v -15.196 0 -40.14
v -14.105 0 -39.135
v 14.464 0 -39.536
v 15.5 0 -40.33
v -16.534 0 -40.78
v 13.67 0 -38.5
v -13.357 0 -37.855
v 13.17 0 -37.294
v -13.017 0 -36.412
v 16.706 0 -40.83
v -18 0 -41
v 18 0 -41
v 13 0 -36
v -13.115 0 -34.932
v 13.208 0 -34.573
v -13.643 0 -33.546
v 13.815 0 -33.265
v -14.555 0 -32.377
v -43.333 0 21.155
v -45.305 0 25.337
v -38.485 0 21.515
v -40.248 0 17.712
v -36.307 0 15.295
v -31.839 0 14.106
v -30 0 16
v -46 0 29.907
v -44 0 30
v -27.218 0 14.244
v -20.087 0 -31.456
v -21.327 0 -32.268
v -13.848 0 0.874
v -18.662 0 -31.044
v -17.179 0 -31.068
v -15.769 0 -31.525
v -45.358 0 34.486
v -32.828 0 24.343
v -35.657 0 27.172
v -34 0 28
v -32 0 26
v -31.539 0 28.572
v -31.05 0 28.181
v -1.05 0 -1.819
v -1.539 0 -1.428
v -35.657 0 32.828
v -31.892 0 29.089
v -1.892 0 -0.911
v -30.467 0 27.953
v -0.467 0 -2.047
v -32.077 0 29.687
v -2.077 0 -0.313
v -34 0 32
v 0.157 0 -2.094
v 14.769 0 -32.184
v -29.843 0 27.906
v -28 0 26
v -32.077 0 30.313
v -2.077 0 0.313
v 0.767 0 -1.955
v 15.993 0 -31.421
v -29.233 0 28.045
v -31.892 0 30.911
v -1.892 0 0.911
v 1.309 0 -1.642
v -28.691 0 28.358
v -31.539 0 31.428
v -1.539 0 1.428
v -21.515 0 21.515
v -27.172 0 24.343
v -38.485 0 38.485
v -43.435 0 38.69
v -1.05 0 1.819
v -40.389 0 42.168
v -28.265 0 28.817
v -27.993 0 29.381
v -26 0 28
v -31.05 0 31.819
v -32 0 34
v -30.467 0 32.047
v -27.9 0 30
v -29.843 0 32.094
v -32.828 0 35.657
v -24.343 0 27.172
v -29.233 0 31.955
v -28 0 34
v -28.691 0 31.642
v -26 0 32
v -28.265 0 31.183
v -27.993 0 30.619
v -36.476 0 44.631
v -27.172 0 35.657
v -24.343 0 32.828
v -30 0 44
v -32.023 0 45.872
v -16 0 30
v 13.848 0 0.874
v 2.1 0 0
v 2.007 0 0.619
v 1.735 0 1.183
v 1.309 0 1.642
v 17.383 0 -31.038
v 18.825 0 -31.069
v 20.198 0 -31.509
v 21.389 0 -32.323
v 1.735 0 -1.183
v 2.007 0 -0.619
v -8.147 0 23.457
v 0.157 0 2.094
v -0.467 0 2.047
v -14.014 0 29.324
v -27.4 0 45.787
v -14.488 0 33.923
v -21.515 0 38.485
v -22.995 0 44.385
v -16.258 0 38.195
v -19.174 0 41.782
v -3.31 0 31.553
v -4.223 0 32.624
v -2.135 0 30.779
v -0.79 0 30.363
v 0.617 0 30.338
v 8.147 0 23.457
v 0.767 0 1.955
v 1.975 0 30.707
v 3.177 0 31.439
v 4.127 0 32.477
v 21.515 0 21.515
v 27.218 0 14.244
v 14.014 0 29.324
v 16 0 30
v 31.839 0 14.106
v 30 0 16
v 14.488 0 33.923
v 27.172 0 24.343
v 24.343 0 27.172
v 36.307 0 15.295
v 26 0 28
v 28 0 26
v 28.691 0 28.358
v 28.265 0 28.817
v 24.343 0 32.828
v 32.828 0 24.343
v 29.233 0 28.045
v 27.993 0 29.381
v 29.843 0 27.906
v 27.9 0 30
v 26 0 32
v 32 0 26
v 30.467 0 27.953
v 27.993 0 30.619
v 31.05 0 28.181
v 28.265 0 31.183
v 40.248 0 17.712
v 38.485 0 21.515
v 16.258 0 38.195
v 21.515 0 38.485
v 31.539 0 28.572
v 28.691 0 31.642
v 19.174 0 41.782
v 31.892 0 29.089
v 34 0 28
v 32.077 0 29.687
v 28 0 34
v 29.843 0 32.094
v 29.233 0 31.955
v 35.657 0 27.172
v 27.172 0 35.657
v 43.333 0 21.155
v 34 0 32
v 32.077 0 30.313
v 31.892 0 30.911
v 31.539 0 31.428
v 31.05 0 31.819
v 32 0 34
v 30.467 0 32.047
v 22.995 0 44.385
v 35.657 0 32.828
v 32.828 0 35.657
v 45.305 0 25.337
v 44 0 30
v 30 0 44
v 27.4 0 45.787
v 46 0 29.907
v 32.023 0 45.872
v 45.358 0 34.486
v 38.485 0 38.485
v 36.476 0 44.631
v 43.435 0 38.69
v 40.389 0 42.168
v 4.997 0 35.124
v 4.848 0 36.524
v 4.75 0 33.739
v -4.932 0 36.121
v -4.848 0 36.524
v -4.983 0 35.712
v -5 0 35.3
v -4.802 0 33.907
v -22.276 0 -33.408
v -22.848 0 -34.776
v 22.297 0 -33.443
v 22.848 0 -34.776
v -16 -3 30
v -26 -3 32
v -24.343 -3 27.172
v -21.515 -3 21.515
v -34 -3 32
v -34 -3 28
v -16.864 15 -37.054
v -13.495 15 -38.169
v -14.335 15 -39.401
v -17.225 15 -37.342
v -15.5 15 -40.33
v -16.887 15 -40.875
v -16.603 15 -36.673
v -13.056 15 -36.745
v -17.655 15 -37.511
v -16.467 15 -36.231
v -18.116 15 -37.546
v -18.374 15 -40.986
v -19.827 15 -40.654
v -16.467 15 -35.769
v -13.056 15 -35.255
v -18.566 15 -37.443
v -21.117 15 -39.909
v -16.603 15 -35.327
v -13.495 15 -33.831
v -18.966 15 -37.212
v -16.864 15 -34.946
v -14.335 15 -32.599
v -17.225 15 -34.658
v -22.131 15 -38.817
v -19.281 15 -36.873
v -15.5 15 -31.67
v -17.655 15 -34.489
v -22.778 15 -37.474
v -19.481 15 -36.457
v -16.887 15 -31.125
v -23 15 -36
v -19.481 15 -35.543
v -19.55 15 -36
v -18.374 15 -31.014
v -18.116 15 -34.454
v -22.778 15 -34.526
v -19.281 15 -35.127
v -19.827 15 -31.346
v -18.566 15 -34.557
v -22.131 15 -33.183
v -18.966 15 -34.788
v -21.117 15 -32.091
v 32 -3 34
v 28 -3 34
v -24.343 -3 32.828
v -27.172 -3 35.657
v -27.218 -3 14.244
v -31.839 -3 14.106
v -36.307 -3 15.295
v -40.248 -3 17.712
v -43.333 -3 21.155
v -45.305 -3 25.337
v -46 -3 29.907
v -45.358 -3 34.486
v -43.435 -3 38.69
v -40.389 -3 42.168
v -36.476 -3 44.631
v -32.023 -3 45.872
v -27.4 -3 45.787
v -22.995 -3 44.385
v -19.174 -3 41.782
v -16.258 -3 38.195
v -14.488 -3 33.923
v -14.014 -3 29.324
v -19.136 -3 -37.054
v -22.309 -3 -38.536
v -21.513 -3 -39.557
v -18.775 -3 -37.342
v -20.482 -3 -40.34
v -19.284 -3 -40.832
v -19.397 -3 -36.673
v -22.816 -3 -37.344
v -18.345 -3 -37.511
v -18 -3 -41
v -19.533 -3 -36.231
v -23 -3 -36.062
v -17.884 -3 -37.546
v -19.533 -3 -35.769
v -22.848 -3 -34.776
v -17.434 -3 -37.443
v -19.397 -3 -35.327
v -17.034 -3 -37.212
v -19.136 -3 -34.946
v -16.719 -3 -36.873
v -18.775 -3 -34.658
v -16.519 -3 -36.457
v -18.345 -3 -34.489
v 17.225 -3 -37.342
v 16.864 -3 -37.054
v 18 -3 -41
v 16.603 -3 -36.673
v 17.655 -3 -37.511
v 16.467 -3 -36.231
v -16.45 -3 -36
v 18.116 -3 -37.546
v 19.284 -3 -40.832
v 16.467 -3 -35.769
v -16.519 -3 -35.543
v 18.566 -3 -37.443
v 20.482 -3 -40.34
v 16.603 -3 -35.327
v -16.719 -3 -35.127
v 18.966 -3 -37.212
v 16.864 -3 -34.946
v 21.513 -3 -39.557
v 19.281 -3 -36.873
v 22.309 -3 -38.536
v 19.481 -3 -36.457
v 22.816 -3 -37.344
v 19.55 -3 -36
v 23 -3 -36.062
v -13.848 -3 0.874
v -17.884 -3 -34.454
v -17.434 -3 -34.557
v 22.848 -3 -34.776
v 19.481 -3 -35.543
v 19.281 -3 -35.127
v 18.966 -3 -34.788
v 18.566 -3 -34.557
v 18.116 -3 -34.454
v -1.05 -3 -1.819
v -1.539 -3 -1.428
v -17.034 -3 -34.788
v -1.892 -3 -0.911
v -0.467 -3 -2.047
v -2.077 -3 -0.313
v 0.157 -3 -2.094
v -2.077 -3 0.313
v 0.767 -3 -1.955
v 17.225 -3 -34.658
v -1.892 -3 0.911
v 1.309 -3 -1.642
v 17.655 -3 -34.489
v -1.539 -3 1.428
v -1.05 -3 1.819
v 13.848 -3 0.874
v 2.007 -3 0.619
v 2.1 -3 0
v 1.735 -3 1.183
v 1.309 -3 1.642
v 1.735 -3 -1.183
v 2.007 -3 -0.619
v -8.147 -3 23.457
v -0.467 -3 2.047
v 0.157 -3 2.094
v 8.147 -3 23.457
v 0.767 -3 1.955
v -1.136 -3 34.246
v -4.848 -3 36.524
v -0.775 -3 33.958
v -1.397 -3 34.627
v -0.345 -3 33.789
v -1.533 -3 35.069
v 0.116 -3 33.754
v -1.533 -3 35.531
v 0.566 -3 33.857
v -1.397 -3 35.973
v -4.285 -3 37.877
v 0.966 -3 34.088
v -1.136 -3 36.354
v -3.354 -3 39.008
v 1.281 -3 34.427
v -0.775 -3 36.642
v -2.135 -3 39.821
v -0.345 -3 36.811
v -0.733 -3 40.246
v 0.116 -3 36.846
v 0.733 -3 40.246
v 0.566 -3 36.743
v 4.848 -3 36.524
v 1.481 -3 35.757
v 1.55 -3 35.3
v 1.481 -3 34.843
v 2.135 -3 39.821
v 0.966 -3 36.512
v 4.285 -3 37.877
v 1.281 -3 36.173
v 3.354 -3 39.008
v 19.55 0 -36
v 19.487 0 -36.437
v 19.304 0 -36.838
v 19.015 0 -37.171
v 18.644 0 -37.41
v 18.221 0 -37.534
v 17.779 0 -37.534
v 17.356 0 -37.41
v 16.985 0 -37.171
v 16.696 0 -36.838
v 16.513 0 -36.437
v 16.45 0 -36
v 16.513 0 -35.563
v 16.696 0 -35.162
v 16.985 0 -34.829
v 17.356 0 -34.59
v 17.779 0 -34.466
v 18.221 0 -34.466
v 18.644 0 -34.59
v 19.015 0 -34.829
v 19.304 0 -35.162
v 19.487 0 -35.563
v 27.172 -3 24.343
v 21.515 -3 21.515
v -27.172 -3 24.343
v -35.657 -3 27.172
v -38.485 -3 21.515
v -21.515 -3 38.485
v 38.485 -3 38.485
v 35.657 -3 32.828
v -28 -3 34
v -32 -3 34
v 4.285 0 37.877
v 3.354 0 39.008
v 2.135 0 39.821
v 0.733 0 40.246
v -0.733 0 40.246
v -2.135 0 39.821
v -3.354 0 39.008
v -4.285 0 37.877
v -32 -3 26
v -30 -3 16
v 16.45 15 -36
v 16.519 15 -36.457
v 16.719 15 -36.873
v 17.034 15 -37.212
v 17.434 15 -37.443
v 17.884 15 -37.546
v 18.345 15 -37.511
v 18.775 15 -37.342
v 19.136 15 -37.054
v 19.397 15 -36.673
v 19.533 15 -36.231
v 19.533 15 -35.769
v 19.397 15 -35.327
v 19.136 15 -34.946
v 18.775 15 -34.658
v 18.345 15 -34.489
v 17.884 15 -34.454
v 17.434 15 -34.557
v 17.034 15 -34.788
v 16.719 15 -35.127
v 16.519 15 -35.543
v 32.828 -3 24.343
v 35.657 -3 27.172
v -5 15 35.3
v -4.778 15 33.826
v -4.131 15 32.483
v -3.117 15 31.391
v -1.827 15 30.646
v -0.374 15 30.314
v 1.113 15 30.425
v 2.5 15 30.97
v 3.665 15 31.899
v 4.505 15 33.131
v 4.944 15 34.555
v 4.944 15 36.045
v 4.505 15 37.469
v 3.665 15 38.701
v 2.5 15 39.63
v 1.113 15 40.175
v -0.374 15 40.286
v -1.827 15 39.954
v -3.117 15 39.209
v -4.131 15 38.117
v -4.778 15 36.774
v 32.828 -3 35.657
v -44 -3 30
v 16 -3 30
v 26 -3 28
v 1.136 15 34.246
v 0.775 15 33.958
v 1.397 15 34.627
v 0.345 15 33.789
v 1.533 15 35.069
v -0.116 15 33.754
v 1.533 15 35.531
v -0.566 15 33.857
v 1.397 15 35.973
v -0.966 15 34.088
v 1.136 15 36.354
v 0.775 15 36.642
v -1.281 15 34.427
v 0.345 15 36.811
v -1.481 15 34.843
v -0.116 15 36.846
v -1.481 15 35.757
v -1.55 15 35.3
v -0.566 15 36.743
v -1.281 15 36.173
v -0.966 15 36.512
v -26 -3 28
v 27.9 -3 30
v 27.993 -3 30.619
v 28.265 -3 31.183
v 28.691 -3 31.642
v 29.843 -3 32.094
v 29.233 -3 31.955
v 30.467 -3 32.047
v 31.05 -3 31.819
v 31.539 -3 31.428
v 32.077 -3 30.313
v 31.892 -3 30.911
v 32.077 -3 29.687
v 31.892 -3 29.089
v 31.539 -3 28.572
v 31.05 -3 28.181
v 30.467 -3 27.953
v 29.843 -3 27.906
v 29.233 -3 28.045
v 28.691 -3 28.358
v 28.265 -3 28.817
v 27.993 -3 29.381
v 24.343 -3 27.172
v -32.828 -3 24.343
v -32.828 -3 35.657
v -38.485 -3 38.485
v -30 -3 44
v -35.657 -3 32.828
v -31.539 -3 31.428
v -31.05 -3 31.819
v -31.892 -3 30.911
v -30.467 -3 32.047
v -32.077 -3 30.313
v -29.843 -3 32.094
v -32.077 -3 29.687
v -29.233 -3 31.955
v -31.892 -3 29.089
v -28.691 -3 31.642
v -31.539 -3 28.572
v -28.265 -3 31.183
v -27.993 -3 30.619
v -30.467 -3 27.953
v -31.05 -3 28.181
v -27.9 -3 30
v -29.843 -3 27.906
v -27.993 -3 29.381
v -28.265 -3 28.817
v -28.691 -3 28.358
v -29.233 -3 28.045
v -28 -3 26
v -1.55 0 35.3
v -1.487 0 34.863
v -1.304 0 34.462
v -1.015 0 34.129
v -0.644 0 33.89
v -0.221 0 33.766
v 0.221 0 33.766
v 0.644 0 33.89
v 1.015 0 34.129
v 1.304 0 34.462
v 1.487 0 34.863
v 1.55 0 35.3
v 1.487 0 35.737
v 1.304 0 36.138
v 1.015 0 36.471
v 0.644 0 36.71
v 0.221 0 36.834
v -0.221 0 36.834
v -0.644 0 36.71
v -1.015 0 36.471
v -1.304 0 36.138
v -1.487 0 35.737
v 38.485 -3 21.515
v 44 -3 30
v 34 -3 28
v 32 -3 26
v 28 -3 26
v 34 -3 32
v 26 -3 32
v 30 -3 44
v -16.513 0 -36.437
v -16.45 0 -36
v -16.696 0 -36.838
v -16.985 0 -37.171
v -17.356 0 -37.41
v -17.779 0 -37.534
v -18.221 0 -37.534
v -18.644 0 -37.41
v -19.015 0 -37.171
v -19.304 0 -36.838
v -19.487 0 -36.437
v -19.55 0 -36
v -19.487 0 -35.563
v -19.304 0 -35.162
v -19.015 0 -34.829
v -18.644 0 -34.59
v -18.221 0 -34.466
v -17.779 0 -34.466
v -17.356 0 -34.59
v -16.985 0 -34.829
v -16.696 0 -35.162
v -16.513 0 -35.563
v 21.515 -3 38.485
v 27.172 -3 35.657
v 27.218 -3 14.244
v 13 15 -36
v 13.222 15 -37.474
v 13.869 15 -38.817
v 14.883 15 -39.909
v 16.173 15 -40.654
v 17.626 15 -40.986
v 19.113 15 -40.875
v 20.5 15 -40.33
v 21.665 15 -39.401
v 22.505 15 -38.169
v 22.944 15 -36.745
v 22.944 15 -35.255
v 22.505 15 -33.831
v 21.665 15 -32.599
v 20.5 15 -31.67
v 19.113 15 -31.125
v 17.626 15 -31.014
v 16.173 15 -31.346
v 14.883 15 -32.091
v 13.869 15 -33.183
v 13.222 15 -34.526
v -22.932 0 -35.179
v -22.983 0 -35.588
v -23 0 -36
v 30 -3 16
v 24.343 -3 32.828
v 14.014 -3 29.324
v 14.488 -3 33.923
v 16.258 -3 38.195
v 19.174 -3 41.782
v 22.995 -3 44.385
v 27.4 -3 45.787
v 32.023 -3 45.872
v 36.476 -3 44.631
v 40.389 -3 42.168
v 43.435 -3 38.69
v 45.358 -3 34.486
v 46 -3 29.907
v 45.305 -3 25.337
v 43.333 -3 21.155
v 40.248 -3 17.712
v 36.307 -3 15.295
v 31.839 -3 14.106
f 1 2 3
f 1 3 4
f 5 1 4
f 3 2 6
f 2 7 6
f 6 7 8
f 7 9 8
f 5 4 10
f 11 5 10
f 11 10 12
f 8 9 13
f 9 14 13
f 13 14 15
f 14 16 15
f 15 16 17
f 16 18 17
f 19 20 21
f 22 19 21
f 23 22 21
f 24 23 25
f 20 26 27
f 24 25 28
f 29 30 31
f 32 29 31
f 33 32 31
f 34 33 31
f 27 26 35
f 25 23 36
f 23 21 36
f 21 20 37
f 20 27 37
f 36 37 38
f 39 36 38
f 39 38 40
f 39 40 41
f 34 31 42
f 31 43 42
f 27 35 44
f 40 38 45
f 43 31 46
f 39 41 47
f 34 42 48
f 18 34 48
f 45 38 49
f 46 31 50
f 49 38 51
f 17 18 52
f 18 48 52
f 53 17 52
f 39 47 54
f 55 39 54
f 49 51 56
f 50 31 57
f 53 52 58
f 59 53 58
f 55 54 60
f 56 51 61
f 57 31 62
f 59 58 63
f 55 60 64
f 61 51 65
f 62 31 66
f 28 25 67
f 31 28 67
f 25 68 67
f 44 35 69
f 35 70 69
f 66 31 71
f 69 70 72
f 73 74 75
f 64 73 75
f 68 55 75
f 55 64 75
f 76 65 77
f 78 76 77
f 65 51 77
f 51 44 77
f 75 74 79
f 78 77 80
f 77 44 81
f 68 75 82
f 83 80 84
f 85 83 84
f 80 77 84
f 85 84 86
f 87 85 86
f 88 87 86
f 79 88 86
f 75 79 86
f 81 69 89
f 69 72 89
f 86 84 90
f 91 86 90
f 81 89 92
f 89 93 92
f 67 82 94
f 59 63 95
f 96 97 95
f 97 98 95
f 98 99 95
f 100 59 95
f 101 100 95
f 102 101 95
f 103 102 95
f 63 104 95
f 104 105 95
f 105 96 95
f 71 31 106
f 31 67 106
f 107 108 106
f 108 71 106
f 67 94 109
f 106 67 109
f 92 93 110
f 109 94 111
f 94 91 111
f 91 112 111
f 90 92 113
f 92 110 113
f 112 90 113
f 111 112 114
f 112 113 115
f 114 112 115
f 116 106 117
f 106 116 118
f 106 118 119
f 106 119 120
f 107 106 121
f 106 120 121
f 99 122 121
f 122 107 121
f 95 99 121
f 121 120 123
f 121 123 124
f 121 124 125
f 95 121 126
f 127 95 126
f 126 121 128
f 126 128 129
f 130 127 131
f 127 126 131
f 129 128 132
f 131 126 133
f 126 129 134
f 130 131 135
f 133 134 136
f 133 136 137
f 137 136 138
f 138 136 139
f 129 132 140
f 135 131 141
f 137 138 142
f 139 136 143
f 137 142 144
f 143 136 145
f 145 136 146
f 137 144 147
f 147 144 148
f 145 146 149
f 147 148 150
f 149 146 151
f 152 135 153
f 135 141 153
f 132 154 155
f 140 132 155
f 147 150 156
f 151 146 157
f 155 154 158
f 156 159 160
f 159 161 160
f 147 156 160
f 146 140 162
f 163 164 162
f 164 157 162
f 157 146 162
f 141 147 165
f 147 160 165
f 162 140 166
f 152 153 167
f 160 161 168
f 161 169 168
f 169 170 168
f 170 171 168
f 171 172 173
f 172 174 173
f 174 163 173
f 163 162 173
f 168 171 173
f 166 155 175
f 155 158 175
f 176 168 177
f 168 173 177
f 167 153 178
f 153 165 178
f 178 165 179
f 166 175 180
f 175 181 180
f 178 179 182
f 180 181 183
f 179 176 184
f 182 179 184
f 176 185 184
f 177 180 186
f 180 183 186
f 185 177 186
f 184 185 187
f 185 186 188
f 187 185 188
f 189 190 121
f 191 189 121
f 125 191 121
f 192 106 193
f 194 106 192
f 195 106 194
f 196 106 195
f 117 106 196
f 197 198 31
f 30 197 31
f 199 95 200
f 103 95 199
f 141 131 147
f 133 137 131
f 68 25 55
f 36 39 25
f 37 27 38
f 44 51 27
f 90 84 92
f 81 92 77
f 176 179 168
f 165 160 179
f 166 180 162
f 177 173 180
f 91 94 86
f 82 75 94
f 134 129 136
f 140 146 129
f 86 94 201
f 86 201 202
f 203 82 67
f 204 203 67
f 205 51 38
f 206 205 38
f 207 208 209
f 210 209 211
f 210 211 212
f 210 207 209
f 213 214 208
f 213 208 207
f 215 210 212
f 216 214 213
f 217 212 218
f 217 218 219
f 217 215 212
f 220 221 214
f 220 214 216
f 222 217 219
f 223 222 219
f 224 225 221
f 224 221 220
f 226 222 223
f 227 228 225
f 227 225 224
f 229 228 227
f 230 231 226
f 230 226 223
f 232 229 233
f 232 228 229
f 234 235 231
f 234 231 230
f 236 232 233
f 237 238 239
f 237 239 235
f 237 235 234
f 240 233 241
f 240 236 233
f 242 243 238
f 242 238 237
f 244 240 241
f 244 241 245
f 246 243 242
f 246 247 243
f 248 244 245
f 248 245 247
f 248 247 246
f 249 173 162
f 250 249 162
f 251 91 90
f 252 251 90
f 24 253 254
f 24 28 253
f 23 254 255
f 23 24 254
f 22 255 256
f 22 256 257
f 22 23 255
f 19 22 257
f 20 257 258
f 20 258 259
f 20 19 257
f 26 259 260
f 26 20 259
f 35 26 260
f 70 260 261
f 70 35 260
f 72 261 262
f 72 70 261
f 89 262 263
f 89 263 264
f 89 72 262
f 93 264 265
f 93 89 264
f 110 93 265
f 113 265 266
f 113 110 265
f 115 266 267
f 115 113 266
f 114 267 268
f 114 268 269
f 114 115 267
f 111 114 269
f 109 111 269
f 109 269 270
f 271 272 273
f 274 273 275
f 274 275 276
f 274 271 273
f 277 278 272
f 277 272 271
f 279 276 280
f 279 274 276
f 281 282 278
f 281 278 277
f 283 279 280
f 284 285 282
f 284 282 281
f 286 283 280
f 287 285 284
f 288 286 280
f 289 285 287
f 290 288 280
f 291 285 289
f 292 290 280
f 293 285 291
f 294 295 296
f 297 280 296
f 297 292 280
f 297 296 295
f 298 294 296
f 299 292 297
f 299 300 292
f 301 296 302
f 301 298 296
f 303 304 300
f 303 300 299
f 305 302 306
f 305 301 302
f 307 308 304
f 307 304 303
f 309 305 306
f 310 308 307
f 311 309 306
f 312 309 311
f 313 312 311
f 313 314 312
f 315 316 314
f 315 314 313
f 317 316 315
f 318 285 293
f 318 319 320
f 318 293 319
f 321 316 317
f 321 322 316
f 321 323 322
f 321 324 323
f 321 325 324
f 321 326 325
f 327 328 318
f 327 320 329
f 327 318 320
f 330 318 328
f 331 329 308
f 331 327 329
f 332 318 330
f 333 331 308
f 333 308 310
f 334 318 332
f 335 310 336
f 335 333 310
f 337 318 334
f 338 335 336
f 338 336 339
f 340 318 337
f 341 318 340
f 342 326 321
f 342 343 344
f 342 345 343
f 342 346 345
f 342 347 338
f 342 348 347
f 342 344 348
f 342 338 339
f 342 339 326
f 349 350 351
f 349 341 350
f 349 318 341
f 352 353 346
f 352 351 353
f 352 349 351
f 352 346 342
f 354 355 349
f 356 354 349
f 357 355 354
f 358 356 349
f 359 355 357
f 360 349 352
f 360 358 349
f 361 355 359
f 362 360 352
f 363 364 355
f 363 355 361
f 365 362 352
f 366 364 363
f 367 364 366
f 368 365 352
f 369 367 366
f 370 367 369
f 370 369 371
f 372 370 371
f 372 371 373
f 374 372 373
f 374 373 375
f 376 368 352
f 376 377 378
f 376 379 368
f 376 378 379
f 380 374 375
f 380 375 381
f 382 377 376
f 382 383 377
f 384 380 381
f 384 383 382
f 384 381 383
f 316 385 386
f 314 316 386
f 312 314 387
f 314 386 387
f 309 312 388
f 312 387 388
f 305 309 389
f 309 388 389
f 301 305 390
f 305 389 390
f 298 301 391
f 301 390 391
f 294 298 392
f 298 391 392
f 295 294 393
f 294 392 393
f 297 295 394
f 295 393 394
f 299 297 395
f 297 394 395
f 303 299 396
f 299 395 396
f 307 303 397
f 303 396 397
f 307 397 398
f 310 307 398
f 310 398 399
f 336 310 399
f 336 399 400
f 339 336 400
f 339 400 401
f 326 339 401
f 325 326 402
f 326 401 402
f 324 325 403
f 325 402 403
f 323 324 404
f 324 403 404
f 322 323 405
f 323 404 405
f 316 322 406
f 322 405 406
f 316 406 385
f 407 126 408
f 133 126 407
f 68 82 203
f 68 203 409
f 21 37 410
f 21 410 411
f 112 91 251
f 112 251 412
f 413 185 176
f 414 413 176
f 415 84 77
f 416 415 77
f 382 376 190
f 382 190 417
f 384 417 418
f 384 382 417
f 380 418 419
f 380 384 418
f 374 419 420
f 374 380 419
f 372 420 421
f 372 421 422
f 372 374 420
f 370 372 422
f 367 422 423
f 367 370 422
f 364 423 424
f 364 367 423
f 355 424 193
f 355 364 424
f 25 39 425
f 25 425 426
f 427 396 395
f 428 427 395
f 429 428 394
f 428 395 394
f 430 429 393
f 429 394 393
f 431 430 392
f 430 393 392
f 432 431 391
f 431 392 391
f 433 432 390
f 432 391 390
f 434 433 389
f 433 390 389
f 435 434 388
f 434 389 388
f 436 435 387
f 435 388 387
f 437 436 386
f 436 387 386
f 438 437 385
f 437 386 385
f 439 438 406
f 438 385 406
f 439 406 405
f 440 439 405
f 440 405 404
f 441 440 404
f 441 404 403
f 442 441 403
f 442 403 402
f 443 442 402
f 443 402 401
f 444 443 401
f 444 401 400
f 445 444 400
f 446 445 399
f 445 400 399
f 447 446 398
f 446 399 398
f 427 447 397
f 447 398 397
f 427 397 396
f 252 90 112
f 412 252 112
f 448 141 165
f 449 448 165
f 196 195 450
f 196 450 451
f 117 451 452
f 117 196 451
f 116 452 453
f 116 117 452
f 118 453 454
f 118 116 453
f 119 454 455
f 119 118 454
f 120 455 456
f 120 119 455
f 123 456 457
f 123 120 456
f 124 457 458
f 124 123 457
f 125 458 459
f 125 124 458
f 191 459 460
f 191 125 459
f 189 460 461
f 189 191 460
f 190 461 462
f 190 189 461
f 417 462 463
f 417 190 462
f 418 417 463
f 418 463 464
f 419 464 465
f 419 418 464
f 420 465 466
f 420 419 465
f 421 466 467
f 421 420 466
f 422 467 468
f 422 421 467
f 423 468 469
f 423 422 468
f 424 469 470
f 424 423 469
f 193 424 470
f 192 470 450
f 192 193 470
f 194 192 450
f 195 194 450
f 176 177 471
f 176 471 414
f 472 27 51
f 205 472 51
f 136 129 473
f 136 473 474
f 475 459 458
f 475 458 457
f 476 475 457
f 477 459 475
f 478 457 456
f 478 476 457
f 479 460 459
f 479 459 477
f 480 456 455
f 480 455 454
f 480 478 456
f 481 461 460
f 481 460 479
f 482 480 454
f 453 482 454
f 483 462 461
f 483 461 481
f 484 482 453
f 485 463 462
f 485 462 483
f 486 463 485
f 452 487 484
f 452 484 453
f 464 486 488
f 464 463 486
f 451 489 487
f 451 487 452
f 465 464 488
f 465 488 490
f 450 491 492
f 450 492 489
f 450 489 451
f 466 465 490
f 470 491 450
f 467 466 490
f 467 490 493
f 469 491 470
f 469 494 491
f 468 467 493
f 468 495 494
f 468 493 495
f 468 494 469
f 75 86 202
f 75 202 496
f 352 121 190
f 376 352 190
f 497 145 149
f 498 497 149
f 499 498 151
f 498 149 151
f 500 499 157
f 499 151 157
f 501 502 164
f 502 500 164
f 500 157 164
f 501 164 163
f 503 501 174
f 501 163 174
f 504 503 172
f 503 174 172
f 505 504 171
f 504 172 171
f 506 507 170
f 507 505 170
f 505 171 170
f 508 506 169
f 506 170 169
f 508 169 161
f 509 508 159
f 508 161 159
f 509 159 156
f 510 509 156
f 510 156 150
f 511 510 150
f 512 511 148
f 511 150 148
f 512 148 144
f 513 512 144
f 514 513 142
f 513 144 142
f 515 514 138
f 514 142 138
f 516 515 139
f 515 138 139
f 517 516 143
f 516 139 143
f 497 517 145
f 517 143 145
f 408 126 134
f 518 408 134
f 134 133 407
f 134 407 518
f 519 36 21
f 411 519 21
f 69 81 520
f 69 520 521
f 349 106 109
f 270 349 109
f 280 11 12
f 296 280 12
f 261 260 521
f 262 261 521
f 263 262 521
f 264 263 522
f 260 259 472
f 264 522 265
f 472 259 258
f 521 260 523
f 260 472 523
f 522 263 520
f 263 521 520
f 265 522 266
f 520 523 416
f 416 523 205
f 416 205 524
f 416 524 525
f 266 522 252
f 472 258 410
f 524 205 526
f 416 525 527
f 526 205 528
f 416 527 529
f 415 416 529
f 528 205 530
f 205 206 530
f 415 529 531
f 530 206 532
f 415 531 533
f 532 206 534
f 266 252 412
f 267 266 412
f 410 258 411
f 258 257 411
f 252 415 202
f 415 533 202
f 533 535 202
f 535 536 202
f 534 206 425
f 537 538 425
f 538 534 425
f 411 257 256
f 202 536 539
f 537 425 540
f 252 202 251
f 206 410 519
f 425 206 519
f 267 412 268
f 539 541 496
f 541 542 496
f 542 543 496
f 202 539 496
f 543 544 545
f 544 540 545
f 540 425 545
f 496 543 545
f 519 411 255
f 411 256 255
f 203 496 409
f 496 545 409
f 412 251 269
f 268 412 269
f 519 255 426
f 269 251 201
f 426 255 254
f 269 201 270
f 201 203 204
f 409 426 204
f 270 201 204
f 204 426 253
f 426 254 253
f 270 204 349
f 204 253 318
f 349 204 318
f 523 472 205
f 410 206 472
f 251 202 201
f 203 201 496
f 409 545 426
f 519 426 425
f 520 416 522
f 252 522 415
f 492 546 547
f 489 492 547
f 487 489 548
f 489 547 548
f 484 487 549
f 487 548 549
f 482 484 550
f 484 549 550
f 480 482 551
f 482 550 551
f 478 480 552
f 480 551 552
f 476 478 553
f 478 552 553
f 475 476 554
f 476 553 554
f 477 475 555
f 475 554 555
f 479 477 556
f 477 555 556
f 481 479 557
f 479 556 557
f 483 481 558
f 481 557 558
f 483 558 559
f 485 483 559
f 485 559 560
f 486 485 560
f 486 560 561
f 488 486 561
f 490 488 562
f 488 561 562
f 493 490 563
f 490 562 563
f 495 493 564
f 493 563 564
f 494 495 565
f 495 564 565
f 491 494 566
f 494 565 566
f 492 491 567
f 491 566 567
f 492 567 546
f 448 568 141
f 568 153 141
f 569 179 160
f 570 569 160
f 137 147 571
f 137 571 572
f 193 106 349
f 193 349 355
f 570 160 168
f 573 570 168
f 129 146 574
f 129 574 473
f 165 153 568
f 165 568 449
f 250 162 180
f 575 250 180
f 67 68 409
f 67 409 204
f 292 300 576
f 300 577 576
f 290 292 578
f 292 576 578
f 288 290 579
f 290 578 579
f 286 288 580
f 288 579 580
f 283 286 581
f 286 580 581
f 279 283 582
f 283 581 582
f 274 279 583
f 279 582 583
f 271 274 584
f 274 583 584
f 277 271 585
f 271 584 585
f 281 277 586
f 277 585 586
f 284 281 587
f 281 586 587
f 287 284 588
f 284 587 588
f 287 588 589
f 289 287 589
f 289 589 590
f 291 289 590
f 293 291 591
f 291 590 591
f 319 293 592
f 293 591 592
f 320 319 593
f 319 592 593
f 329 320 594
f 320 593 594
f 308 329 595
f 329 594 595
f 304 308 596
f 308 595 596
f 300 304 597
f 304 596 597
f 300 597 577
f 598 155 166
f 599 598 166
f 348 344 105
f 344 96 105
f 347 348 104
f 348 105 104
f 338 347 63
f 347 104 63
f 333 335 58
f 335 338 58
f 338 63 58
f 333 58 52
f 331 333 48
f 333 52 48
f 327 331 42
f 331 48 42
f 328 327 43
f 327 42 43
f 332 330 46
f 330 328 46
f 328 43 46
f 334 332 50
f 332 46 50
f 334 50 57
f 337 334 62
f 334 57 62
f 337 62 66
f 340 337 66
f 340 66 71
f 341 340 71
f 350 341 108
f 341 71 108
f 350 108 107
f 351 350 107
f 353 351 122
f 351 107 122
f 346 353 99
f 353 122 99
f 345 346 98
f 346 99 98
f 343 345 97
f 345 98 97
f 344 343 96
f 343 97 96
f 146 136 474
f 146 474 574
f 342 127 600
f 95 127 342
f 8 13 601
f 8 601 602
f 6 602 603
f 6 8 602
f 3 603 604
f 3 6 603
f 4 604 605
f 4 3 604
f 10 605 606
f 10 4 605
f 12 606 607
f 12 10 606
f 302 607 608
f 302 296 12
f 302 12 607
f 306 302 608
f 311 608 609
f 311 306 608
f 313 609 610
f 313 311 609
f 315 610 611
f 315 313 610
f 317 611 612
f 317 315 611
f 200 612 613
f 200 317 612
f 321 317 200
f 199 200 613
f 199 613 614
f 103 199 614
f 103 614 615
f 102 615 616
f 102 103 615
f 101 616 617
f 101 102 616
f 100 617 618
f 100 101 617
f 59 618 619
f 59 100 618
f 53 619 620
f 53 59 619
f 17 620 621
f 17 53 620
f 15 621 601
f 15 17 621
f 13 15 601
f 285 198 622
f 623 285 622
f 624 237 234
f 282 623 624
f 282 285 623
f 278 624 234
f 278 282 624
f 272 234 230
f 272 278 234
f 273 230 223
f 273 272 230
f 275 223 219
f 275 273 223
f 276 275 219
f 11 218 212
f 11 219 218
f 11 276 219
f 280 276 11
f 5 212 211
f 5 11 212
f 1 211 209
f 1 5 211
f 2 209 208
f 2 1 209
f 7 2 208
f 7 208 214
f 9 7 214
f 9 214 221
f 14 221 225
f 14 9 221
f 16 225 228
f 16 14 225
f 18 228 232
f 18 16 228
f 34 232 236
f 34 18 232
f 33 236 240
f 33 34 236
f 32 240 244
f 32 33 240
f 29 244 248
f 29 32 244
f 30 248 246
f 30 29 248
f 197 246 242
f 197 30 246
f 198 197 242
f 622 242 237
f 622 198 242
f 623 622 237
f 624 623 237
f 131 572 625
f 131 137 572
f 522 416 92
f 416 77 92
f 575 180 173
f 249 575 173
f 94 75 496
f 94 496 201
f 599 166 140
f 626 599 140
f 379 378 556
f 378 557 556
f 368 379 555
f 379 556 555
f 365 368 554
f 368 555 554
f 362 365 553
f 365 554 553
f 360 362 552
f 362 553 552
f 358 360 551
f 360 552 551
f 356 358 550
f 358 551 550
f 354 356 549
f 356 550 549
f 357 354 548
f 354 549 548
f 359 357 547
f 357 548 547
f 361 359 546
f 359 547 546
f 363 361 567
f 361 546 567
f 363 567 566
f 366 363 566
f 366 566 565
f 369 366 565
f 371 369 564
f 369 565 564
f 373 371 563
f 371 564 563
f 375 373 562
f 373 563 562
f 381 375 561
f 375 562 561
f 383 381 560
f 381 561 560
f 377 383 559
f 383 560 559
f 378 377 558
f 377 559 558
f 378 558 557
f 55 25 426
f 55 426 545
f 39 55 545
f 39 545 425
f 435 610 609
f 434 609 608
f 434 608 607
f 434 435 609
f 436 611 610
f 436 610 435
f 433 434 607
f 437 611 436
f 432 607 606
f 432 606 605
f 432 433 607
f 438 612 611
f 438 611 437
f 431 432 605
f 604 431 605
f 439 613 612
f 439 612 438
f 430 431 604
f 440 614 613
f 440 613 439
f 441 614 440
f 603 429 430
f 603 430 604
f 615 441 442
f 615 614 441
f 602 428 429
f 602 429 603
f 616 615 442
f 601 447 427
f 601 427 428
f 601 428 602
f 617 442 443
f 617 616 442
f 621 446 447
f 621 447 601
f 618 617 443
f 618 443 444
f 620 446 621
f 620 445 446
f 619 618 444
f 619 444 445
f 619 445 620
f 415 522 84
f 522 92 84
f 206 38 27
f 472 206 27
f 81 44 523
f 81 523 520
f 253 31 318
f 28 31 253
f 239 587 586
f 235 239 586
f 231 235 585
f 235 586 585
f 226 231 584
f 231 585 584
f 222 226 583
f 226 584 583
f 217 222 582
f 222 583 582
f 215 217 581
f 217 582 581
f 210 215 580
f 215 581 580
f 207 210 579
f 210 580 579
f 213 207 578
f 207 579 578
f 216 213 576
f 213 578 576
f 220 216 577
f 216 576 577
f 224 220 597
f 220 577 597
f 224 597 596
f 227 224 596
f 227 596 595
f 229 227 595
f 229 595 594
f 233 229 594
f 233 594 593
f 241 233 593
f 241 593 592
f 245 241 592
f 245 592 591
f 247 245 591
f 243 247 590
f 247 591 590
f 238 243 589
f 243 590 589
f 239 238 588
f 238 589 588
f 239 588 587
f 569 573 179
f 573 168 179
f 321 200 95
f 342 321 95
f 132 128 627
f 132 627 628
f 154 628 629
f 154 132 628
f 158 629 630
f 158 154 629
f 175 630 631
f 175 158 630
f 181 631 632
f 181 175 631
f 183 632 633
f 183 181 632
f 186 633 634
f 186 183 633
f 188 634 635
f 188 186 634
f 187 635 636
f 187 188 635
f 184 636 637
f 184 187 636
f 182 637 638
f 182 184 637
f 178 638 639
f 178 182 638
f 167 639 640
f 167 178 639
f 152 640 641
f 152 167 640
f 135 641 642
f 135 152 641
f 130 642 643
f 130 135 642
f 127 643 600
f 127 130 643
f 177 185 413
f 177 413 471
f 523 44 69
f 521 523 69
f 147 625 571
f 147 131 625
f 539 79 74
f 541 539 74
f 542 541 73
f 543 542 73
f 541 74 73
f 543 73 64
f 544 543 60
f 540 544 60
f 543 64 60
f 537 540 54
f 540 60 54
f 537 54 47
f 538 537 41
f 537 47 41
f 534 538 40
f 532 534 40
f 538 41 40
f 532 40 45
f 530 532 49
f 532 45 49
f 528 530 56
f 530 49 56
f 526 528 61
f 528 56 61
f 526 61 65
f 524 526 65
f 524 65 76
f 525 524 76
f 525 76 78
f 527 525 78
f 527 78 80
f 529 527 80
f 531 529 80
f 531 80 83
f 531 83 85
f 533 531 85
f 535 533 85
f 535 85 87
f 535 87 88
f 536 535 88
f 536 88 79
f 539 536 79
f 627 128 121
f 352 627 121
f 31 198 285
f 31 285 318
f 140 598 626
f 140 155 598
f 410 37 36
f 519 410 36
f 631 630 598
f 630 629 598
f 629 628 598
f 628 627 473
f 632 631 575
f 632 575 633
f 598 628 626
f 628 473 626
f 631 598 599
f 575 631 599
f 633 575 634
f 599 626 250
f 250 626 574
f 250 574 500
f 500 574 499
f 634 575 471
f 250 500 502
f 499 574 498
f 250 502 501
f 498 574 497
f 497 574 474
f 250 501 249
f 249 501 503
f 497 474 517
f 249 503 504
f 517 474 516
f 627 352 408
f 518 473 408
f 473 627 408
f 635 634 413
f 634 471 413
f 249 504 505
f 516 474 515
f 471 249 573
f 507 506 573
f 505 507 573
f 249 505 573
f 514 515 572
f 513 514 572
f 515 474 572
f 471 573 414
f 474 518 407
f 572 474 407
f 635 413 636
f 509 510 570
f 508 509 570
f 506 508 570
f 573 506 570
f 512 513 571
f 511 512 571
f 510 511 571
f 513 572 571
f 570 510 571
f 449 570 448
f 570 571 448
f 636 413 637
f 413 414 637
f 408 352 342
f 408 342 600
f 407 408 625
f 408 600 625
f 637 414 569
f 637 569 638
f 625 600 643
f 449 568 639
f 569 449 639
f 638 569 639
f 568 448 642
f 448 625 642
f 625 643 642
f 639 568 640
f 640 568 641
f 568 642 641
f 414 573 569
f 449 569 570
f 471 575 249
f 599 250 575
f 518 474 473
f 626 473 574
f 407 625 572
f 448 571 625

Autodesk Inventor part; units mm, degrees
ref_plane "YZ Plane" through (0, 0, 0) normal (1, 0, 0) x (0, 1, 0)
ref_plane "XZ Plane" through (0, 0, 0) normal (0, 1, 0) x (-1, 0, 0)
ref_plane "XY Plane" through (0, 0, 0) normal (0, 0, 1) x (1, 0, 0)
sketch "Sketch1" plane through (0, 0, 0) normal (0, 1, 0) x (-1, 0, 0)
  circle A0 centre (0, 35.3) radius 1.55
  circle A1 centre (18, -36) radius 1.55
  circle A2 centre (-18, -36) radius 1.55
  circle A3 centre (0, 35.3) radius 5
  circle A4 centre (18, -36) radius 5
  circle A5 centre (-18, -36) radius 5
  point P0 (0, 0)
  dimension "d0" = 35.3
  dimension "d1" = 36
  dimension "d2" = 3.1
  dimension "d3" = 10
  dimension "d4" = 36
  dimension "d5" = 18
extrude "Extrusion1" add sketch "Sketch1" along normal blind 15
sketch "Sketch2" plane through (0, 0, 35.3) normal (0, -1, 0) x (1, 0, 0)
  circle A0 centre (0, 0) radius 5 projected
  circle A1 centre (0, 0) radius 1.55 projected
  circle A2 centre (-18, -71.3) radius 1.55 projected
  circle A3 centre (-18, -71.3) radius 5 projected
  circle A4 centre (18, -71.3) radius 1.55 projected
  circle A5 centre (18, -71.3) radius 5 projected
  line L0 (-22.8479, -70.0761) -> (-4.8479, 1.2239)
  line L1 (22.8479, -70.0761) -> (4.8479, 1.2239)
  line L2 (-18, -76.3) -> (18, -76.3)
  circle A6 centre (0, -35.3) radius 2.1
  dimension "d8" = 4.2
extrude "Extrusion2" add sketch "Sketch2" along normal blind 3
sketch "Sketch3" plane through (0, 0, 35.3) normal (0, 1, 0) x (1, 0, 0)
  circle A0 centre (-30, 5.3) radius 16
  circle A1 centre (0, 35.3) radius 29.9 construction
  line L0 (0, 35.3) -> (-30, 5.3) construction
  line L1 (0, 35.3) -> (-30, 35.3) construction
  circle A2 centre (-30, 5.3) radius 2.1 construction
  line L2 (-28, 9.3) -> (-32, 9.3)
  line L3 (-32, 9.3) -> (-30, 19.3)
  line L4 (-30, 19.3) -> (-28, 9.3)
  line L5 (-27.9, 5.3) -> (-32.1, 5.3) construction
  line L6 (-30, 3.2) -> (-30, 7.4) construction
  line L7 (-30, 5.3) -> (-30, 35.3) construction
  line L8 (-26, 3.3) -> (-26, 7.3)
  line L9 (-26, 7.3) -> (-16, 5.3)
  line L10 (-16, 5.3) -> (-26, 3.3)
  line L11 (-24.3431, 8.1284) -> (-27.1716, 10.9569)
  line L12 (-27.1716, 10.9569) -> (-21.5147, 13.7853)
  line L13 (-24.3431, 8.1284) -> (-21.5147, 13.7853)
  circle A3 centre (-30, 5.3) radius 2.1
  line L14 (-24.3431, 2.4716) -> (-27.1716, -0.3569)
  line L15 (-27.1716, -0.3569) -> (-21.5147, -3.1853)
  line L16 (-24.3431, 2.4716) -> (-21.5147, -3.1853)
  line L17 (-35.6569, 8.1284) -> (-32.8284, 10.9569)
  line L18 (-32.8284, 10.9569) -> (-38.4853, 13.7853)
  line L19 (-35.6569, 8.1284) -> (-38.4853, 13.7853)
  line L20 (-35.6569, 2.4716) -> (-38.4853, -3.1853)
  line L21 (-32.8284, -0.3569) -> (-38.4853, -3.1853)
  line L22 (-35.6569, 2.4716) -> (-32.8284, -0.3569)
  line L23 (-34, 3.3) -> (-34, 7.3)
  line L24 (-34, 7.3) -> (-44, 5.3)
  line L25 (-44, 5.3) -> (-34, 3.3)
  line L26 (-28, 1.3) -> (-32, 1.3)
  line L27 (-32, 1.3) -> (-30, -8.7)
  line L28 (-30, -8.7) -> (-28, 1.3)
  circle A4 centre (0, 0) radius 5 projected
  line L29 (-4.8479, -1.2239) -> (-22.8479, 70.0761) projected
  line L30 (-13.8479, 34.4261) -> (-27.2178, 21.0562)
  line L31 (-8.1467, 11.8431) -> (-14.0143, 5.9755)
  circle A5 centre (0, 35.3) radius 2.1 construction
  point P0 (-25.7574, 9.5426)
  dimension "d41" = 59.8
  dimension "d49" = 30
  dimension "d50" = 45
  dimension "d51" = 32
  dimension "d52" = 4.2
  dimension "d53" = 4
  dimension "d54" = 10
  dimension "d55" = 4
  dimension "d56" = 4
  dimension "d57" = 4
  dimension "d58" = 6
  dimension "d59" = 6
  dimension "d70" = 20
  dimension "d71" = 45
extrude "Extrusion3" add sketch "Sketch3" against normal blind 3 contours A0 | A0 L30 L29 L31
mirror "Mirror1" about plane through (0, 0, 0) normal (1, 0, 0) of "Extrusion3"
equation "\"d5\" = 0.5 * d4"
properties part number "BASE_LIDAR" material "ABS Plastic"
